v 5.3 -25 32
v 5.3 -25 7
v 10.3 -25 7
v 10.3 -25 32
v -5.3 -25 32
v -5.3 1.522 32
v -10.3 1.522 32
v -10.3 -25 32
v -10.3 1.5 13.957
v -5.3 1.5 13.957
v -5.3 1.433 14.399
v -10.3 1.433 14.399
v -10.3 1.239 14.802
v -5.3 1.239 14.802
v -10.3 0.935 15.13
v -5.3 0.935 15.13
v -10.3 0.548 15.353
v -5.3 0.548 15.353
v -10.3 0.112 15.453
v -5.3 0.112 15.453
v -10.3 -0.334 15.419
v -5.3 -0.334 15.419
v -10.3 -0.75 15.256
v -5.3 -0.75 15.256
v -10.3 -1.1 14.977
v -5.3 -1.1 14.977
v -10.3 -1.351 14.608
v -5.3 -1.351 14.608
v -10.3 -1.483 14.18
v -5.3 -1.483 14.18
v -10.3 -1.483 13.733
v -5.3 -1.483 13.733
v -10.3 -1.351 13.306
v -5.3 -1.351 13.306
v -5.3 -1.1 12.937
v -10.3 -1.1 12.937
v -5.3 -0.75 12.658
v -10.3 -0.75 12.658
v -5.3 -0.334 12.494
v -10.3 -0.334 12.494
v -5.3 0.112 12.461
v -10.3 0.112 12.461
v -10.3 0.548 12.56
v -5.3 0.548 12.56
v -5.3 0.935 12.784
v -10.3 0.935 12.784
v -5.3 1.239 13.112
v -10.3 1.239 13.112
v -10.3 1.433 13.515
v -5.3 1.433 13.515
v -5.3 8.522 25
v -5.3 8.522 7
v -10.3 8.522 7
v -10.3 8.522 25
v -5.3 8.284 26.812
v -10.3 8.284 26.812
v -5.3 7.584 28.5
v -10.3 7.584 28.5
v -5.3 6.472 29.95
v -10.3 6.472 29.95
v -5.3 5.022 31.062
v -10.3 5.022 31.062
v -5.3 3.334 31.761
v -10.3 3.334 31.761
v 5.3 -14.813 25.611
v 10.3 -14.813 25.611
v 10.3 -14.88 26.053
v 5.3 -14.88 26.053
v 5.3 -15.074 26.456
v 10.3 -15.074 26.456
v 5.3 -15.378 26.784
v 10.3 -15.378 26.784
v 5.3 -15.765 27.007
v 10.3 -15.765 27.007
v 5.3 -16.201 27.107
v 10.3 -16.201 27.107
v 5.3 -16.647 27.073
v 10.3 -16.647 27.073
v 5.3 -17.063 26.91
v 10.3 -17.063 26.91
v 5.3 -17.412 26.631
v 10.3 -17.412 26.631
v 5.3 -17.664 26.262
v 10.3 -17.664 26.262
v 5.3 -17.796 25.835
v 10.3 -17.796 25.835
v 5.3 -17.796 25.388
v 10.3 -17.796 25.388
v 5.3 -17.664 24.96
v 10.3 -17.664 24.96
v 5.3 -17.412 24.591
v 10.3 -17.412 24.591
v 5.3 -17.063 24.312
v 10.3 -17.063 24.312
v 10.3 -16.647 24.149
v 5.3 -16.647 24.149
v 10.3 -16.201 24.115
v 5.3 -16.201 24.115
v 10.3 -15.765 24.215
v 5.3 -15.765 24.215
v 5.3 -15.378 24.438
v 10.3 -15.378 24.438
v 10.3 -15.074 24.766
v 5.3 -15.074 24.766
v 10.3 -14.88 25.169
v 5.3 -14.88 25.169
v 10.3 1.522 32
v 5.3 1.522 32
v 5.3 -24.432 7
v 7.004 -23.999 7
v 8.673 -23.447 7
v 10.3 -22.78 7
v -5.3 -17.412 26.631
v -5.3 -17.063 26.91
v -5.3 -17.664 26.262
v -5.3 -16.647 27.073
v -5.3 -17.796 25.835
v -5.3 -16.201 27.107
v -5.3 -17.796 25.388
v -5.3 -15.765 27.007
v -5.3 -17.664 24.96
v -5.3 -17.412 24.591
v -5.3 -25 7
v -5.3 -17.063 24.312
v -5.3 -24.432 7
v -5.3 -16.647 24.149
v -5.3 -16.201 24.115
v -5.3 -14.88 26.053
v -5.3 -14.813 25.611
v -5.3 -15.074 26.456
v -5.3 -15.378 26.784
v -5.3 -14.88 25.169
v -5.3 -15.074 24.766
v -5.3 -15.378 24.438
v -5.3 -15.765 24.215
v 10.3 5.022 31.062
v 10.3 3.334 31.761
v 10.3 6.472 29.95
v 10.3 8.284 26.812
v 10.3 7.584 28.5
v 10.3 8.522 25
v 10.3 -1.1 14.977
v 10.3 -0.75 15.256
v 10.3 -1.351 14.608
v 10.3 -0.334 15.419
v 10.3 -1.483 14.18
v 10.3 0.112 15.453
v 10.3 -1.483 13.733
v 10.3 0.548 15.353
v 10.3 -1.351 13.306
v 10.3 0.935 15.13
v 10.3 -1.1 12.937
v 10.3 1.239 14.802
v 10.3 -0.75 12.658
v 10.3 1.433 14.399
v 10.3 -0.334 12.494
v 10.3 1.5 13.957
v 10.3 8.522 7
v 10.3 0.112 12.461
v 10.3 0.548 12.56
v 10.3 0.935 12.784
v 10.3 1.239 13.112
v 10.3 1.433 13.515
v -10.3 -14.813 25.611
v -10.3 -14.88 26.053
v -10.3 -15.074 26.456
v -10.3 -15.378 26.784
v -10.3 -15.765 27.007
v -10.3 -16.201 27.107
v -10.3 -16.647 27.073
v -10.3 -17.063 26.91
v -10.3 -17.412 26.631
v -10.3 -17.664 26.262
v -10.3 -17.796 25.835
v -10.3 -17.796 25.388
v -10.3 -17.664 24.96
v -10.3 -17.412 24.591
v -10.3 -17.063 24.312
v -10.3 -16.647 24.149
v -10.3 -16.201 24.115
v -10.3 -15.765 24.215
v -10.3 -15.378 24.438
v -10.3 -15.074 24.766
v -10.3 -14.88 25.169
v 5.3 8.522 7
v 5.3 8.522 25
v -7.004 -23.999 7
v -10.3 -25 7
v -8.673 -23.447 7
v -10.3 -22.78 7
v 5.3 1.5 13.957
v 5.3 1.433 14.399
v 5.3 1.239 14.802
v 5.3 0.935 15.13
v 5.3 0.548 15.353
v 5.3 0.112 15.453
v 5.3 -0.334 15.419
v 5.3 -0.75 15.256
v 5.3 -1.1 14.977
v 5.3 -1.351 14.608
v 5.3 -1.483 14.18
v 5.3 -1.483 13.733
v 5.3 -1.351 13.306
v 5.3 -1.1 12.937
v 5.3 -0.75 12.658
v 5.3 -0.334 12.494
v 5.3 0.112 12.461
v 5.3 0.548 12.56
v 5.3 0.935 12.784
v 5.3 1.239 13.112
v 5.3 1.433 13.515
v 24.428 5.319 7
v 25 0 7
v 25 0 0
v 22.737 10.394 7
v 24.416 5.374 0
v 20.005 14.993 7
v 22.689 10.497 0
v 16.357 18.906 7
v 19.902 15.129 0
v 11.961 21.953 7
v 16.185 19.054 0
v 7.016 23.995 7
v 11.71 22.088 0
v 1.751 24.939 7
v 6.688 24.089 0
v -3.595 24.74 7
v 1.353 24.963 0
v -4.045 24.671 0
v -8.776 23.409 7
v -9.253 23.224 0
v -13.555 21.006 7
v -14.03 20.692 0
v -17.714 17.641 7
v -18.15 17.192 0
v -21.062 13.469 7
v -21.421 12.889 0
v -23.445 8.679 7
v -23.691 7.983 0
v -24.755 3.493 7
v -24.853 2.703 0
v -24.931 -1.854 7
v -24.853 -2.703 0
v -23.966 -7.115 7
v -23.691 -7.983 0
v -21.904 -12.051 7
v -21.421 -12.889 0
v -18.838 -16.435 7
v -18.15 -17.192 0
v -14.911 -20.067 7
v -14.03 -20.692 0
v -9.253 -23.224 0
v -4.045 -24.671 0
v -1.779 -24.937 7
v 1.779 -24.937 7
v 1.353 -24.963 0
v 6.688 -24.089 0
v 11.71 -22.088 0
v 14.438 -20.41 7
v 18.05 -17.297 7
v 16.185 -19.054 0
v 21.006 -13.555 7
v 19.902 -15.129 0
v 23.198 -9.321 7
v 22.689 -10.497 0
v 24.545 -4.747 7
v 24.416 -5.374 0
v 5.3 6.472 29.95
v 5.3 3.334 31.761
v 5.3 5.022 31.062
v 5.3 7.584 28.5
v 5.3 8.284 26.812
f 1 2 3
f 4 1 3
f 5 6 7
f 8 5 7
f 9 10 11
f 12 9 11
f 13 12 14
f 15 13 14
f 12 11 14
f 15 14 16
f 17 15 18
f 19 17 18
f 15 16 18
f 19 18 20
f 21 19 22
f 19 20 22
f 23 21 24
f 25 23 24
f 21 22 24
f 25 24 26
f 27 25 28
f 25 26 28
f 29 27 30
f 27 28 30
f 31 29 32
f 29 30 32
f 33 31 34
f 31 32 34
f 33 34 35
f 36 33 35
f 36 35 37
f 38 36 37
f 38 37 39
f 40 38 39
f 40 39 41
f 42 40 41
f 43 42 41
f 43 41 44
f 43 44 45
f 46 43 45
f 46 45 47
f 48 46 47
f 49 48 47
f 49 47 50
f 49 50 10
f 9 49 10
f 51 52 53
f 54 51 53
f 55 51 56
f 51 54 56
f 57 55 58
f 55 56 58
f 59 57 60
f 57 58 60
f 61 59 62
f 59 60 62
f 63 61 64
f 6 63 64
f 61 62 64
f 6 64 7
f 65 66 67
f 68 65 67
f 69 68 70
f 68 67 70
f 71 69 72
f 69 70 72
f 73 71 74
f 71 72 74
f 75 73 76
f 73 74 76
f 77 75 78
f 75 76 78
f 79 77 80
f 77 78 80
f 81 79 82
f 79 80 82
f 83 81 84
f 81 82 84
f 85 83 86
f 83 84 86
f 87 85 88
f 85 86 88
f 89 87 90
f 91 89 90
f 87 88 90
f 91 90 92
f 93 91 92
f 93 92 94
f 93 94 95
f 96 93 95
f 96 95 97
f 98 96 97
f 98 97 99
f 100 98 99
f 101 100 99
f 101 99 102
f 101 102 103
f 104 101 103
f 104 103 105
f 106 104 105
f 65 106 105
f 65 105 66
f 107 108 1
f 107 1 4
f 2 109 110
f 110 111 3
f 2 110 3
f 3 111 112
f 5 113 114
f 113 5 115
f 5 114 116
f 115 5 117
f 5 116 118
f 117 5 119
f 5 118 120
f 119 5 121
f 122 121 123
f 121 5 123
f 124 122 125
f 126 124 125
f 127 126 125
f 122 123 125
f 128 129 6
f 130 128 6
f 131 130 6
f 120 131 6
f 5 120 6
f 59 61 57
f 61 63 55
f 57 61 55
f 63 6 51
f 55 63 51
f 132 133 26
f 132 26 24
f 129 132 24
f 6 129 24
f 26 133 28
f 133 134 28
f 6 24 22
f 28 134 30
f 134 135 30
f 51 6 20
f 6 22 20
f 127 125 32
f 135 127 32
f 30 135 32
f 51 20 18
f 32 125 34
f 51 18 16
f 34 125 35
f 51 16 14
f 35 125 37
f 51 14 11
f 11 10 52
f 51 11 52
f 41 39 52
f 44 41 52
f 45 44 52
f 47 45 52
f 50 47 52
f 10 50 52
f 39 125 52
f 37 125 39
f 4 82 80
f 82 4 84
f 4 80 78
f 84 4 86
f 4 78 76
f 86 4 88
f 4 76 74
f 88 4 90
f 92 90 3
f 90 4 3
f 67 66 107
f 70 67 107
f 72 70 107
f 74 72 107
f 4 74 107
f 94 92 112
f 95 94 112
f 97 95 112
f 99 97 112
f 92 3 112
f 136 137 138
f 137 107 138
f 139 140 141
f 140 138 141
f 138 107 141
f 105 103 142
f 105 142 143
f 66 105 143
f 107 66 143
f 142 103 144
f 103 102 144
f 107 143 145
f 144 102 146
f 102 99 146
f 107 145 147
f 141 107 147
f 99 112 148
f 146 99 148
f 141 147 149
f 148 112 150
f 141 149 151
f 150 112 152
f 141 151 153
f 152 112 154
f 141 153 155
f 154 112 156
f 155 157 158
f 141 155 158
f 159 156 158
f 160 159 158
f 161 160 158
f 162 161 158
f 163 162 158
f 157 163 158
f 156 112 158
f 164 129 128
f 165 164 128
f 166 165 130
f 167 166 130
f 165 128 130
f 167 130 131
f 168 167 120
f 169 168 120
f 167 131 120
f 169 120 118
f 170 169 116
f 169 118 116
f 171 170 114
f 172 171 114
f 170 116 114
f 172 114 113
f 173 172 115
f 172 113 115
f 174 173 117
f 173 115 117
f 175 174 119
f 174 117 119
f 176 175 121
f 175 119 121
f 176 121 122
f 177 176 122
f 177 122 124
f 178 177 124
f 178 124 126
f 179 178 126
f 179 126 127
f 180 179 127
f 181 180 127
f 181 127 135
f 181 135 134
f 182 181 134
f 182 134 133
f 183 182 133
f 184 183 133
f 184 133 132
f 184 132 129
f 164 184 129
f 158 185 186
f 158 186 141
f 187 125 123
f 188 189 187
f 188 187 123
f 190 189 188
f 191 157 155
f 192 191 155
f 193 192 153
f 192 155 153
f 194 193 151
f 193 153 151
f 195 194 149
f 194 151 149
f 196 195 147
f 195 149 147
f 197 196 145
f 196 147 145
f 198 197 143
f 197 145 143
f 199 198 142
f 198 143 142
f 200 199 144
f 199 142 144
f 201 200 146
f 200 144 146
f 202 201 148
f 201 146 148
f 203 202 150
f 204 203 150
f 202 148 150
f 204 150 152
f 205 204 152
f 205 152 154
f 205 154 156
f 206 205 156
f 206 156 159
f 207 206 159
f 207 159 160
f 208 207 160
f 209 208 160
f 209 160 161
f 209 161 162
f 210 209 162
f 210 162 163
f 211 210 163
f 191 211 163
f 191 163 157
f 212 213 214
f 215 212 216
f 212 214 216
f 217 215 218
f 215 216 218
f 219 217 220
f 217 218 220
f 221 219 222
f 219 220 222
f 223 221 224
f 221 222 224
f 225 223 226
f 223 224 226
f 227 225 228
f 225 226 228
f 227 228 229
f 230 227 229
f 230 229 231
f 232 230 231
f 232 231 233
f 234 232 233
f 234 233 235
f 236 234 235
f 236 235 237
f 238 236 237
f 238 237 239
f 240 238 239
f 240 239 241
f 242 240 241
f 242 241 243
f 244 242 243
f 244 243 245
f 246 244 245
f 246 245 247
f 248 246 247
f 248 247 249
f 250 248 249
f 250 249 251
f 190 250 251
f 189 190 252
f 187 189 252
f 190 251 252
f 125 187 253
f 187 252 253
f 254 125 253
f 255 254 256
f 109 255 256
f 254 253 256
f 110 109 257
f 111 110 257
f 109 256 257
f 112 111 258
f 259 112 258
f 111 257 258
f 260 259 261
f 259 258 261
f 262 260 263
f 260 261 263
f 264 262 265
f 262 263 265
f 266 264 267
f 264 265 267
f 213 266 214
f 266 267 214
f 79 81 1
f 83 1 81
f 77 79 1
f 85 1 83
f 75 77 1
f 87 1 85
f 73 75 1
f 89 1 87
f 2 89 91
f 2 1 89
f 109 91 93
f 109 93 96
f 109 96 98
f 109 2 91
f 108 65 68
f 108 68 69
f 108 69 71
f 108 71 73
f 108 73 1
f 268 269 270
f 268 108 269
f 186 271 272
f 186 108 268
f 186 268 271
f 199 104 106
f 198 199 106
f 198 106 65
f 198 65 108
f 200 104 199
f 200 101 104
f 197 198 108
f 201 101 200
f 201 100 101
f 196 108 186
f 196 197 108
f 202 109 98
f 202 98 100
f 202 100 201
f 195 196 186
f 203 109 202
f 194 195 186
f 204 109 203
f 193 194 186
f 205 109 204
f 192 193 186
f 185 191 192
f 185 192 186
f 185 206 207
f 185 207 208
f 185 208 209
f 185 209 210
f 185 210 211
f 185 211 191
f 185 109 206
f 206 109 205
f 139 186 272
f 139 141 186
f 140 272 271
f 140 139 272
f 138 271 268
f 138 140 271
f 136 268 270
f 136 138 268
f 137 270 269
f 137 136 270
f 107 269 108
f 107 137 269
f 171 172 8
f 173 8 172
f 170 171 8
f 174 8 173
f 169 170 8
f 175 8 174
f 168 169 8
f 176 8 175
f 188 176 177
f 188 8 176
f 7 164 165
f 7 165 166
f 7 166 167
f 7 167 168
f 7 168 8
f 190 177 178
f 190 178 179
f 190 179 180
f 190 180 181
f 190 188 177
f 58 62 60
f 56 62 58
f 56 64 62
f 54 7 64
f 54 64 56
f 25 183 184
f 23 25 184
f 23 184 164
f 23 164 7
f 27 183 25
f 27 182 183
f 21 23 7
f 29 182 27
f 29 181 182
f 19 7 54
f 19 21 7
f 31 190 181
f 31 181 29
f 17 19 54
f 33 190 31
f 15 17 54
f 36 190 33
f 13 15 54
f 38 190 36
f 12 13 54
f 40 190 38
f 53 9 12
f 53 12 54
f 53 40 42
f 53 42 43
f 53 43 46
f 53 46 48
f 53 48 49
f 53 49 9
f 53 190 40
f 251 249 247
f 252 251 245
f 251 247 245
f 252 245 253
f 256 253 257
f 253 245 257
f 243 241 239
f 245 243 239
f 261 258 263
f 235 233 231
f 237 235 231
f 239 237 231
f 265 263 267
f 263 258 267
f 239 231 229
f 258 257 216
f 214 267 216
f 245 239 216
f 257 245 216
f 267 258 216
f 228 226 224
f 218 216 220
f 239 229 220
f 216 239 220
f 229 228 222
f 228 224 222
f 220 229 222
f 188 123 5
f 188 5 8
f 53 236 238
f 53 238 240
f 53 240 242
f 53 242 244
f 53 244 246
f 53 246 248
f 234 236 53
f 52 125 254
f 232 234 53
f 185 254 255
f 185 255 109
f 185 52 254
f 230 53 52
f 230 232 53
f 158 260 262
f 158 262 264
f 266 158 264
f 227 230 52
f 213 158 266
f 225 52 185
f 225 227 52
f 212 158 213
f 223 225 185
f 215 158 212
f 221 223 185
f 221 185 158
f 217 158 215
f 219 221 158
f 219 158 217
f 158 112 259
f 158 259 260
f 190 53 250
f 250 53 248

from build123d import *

# Parameters (mm, degrees)
SKETCH_R     = 25
PAD_DEPTH    = 7
SKETCH001_W  = 5
SKETCH001_H  = 33.522271
PAD001_DEPTH = 25
FILLET_R     = 7
SKETCH002_R  = 1.5
POCKET_DEPTH = 35.301


with BuildPart() as part:
    # Sketch → Pad (new body)
    with BuildSketch(Plane.XY):
        Circle(SKETCH_R)
    extrude(amount=PAD_DEPTH)

    # Sketch001 → Pad001 (new body)
    with BuildSketch(Plane.XY.offset(7)):
        with Locations((7.8, -8.238865)):
            Rectangle(SKETCH001_W, SKETCH001_H)
    pad001 = extrude(amount=PAD001_DEPTH)

    # Mirrored: Pad001 across Sketch001 V_Axis
    add(pad001.mirror(Plane(origin=(0, 0, 7), x_dir=(0, 0, 1), z_dir=(1, 0, 0))))

    # Fillet
    fillet_edges = [part.edges().sort_by_distance(p)[0] for p in [
        (7.8, 8.522271, 32),
        (-7.8, 8.522271, 32),
    ]]
    fillet(fillet_edges, radius=FILLET_R)

    # Sketch002 → Pocket (cut, through all)
    with BuildSketch(Plane.YZ.offset(10.3)):
        with Locations((0, 13.956767)):
            Circle(SKETCH002_R)
        with Locations((-16.31287, 25.611097)):
            Circle(SKETCH002_R)
    extrude(amount=-POCKET_DEPTH, mode=Mode.SUBTRACT)


solid = part.part
